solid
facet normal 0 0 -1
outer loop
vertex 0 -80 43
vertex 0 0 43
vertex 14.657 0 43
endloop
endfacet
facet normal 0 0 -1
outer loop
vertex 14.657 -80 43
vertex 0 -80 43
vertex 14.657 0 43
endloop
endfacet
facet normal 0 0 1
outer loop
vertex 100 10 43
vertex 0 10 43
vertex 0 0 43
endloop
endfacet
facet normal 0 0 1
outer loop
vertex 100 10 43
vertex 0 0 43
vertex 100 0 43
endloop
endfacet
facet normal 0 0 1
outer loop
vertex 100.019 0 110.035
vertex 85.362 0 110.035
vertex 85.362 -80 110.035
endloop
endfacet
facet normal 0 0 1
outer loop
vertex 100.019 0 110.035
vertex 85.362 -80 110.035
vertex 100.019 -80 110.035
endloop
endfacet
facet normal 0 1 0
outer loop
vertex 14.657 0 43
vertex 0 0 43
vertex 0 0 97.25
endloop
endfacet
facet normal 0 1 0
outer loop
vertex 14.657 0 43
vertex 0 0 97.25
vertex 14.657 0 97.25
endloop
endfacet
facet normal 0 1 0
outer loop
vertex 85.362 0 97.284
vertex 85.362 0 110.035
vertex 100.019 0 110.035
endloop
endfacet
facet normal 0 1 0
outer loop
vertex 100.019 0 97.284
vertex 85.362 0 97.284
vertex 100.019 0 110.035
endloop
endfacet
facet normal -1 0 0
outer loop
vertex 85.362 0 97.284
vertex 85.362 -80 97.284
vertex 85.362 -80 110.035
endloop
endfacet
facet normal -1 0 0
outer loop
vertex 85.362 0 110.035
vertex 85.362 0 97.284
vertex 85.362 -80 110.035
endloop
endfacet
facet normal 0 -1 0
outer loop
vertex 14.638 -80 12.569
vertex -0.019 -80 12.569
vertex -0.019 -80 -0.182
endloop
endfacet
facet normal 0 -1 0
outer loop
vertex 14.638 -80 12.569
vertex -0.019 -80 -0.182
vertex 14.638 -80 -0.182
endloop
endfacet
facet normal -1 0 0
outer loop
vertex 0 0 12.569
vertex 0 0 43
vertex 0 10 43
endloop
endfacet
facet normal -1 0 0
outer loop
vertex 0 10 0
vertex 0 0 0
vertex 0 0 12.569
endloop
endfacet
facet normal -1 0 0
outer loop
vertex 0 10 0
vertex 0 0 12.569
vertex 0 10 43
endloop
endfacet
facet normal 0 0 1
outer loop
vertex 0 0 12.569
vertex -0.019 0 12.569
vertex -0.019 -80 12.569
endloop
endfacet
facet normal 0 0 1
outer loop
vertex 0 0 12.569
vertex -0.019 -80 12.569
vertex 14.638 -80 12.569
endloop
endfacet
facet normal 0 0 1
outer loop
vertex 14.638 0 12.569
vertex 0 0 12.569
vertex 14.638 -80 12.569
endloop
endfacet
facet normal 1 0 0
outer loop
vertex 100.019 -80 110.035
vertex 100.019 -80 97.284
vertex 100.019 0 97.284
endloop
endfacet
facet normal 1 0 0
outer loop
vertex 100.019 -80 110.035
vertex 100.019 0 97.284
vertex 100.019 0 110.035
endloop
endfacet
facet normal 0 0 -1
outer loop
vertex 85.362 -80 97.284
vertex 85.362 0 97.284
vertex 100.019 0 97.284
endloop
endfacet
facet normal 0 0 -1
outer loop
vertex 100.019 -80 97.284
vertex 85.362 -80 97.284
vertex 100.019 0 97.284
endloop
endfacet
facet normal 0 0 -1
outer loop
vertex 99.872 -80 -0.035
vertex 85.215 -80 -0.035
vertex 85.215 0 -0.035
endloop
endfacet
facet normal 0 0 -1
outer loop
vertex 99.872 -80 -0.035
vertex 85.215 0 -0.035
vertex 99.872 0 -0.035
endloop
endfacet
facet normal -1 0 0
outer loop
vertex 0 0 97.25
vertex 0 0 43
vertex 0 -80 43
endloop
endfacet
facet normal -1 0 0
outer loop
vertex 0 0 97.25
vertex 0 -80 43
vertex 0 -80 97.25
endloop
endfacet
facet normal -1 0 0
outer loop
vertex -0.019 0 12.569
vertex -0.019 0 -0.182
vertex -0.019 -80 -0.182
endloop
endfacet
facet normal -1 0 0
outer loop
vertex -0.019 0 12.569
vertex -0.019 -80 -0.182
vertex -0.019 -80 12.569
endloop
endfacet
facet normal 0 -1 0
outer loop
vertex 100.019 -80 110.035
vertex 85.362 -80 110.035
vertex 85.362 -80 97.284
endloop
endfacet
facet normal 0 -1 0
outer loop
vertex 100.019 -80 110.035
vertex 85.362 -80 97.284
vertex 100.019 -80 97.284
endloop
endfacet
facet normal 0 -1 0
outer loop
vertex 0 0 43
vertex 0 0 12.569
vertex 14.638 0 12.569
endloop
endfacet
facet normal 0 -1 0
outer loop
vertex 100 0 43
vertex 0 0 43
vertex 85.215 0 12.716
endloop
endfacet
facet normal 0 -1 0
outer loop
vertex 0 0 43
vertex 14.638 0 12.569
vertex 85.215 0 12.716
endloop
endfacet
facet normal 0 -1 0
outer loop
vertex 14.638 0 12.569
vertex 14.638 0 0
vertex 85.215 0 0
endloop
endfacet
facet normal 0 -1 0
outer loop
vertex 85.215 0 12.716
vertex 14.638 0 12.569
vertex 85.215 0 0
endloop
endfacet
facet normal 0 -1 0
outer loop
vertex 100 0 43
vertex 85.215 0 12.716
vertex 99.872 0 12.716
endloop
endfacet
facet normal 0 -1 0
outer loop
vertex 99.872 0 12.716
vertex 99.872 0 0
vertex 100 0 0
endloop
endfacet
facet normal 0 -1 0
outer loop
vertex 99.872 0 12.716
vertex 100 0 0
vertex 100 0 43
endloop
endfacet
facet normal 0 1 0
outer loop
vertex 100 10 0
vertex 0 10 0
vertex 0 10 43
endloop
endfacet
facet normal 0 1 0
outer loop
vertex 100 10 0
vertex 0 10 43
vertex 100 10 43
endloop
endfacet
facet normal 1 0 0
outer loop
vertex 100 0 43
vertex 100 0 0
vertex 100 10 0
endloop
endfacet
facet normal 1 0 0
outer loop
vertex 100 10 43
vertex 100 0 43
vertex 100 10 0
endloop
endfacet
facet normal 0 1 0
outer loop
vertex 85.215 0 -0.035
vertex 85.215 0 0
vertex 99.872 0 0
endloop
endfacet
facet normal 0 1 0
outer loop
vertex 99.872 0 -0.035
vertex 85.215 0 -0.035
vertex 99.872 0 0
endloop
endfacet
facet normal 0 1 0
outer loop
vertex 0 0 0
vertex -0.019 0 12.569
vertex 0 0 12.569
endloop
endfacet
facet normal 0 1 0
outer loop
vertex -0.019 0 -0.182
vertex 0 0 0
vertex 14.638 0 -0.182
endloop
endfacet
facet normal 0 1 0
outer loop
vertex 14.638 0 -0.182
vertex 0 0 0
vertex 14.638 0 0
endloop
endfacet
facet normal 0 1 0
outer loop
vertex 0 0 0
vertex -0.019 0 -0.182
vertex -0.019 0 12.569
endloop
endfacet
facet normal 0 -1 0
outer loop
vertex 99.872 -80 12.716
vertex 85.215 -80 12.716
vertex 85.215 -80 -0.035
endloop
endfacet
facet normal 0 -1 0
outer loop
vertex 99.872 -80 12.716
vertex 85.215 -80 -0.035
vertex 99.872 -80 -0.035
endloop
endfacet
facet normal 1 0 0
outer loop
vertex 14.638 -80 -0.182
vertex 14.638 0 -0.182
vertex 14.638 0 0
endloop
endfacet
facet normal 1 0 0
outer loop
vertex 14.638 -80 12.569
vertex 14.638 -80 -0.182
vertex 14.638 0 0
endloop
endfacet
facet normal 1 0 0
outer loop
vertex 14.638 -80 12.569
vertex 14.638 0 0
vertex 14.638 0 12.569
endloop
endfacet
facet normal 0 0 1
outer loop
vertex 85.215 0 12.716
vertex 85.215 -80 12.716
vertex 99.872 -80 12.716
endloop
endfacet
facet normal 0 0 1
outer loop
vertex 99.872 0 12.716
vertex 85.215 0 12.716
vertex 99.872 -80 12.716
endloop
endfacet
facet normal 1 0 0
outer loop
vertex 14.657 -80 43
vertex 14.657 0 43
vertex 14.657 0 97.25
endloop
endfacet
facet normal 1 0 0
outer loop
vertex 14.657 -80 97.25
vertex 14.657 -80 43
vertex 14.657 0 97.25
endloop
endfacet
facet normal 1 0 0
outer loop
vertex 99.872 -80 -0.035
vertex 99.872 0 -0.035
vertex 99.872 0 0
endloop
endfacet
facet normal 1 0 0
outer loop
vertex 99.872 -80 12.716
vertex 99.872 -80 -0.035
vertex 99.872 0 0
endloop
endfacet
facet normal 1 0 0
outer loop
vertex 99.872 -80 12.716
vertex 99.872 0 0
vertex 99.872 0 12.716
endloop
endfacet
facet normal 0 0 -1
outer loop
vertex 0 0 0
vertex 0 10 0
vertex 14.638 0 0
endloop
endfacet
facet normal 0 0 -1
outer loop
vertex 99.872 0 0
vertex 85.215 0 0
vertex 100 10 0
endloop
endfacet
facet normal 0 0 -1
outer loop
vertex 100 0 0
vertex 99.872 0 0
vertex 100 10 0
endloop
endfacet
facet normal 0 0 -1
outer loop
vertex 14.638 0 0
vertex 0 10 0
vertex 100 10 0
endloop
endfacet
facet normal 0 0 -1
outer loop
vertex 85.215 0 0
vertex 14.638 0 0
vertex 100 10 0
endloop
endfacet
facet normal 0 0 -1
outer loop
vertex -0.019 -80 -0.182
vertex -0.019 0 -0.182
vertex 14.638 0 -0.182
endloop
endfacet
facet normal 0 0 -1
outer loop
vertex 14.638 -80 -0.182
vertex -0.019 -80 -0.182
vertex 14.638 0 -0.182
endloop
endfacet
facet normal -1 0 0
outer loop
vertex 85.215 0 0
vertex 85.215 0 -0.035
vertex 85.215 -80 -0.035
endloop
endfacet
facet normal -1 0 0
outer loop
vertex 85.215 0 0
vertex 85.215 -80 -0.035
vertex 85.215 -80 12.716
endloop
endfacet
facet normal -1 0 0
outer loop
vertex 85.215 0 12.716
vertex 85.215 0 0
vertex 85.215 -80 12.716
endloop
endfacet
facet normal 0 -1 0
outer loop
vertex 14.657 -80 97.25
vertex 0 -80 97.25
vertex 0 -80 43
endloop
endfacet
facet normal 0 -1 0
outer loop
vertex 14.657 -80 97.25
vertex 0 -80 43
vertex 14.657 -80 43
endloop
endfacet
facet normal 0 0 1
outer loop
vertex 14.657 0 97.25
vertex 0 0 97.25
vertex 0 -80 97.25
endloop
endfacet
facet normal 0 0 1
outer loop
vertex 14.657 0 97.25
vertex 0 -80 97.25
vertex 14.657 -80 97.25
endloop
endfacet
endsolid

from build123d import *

# Parameters (mm, degrees)
SKETCH1_W           = 100
SKETCH1_H           = 10
BOSS_EXTRUDE1_DEPTH = 43
SKETCH2_W           = 14.657296337
SKETCH2_H           = 12.750406224
SKETCH2_H_2         = 54.249593776
SKETCH2_W_2         = 14.657296336
BOSS_EXTRUDE2_DEPTH = 80


with BuildPart() as part:
    # Sketch1 → Boss-Extrude1 (new body)
    with BuildSketch(Plane.XY):
        with Locations((50, 5)):
            Rectangle(SKETCH1_W, SKETCH1_H)
    extrude(amount=BOSS_EXTRUDE1_DEPTH)

    # Sketch2 → Boss-Extrude2 (add)
    with BuildSketch(Plane.XZ):
        with Locations((92.690459103, 103.659485129)):
            Rectangle(SKETCH2_W, SKETCH2_H)
        with Locations((7.328648169, 70.124796888)):
            Rectangle(SKETCH2_W, SKETCH2_H_2)
        with Locations((7.309540898, 6.193559762)):
            Rectangle(SKETCH2_W, SKETCH2_H)
        with Locations((92.543503994, 6.340514871)):
            Rectangle(SKETCH2_W_2, SKETCH2_H)
    extrude(amount=BOSS_EXTRUDE2_DEPTH)


with BuildPart() as boss_extrude2_piece_1:
    # of the separate pieces the step leaves, piece 1, a body of its own (boss_extrude2_pieces)
    add(part.part.solids().sort_by_distance((0, 0, 12.568762874))[0])


with BuildPart() as boss_extrude2_piece_2:
    # of the separate pieces the step leaves, piece 2, a body of its own (boss_extrude2_pieces)
    add(part.part.solids().sort_by_distance((0, -80, 43))[0])


with BuildPart() as boss_extrude2_piece_3:
    # of the separate pieces the step leaves, piece 3, a body of its own (boss_extrude2_pieces)
    add(part.part.solids().sort_by_distance((85.361810934, 0, 110.034688241))[0])


solid = Compound([boss_extrude2_piece_1.part, boss_extrude2_piece_2.part, boss_extrude2_piece_3.part])
